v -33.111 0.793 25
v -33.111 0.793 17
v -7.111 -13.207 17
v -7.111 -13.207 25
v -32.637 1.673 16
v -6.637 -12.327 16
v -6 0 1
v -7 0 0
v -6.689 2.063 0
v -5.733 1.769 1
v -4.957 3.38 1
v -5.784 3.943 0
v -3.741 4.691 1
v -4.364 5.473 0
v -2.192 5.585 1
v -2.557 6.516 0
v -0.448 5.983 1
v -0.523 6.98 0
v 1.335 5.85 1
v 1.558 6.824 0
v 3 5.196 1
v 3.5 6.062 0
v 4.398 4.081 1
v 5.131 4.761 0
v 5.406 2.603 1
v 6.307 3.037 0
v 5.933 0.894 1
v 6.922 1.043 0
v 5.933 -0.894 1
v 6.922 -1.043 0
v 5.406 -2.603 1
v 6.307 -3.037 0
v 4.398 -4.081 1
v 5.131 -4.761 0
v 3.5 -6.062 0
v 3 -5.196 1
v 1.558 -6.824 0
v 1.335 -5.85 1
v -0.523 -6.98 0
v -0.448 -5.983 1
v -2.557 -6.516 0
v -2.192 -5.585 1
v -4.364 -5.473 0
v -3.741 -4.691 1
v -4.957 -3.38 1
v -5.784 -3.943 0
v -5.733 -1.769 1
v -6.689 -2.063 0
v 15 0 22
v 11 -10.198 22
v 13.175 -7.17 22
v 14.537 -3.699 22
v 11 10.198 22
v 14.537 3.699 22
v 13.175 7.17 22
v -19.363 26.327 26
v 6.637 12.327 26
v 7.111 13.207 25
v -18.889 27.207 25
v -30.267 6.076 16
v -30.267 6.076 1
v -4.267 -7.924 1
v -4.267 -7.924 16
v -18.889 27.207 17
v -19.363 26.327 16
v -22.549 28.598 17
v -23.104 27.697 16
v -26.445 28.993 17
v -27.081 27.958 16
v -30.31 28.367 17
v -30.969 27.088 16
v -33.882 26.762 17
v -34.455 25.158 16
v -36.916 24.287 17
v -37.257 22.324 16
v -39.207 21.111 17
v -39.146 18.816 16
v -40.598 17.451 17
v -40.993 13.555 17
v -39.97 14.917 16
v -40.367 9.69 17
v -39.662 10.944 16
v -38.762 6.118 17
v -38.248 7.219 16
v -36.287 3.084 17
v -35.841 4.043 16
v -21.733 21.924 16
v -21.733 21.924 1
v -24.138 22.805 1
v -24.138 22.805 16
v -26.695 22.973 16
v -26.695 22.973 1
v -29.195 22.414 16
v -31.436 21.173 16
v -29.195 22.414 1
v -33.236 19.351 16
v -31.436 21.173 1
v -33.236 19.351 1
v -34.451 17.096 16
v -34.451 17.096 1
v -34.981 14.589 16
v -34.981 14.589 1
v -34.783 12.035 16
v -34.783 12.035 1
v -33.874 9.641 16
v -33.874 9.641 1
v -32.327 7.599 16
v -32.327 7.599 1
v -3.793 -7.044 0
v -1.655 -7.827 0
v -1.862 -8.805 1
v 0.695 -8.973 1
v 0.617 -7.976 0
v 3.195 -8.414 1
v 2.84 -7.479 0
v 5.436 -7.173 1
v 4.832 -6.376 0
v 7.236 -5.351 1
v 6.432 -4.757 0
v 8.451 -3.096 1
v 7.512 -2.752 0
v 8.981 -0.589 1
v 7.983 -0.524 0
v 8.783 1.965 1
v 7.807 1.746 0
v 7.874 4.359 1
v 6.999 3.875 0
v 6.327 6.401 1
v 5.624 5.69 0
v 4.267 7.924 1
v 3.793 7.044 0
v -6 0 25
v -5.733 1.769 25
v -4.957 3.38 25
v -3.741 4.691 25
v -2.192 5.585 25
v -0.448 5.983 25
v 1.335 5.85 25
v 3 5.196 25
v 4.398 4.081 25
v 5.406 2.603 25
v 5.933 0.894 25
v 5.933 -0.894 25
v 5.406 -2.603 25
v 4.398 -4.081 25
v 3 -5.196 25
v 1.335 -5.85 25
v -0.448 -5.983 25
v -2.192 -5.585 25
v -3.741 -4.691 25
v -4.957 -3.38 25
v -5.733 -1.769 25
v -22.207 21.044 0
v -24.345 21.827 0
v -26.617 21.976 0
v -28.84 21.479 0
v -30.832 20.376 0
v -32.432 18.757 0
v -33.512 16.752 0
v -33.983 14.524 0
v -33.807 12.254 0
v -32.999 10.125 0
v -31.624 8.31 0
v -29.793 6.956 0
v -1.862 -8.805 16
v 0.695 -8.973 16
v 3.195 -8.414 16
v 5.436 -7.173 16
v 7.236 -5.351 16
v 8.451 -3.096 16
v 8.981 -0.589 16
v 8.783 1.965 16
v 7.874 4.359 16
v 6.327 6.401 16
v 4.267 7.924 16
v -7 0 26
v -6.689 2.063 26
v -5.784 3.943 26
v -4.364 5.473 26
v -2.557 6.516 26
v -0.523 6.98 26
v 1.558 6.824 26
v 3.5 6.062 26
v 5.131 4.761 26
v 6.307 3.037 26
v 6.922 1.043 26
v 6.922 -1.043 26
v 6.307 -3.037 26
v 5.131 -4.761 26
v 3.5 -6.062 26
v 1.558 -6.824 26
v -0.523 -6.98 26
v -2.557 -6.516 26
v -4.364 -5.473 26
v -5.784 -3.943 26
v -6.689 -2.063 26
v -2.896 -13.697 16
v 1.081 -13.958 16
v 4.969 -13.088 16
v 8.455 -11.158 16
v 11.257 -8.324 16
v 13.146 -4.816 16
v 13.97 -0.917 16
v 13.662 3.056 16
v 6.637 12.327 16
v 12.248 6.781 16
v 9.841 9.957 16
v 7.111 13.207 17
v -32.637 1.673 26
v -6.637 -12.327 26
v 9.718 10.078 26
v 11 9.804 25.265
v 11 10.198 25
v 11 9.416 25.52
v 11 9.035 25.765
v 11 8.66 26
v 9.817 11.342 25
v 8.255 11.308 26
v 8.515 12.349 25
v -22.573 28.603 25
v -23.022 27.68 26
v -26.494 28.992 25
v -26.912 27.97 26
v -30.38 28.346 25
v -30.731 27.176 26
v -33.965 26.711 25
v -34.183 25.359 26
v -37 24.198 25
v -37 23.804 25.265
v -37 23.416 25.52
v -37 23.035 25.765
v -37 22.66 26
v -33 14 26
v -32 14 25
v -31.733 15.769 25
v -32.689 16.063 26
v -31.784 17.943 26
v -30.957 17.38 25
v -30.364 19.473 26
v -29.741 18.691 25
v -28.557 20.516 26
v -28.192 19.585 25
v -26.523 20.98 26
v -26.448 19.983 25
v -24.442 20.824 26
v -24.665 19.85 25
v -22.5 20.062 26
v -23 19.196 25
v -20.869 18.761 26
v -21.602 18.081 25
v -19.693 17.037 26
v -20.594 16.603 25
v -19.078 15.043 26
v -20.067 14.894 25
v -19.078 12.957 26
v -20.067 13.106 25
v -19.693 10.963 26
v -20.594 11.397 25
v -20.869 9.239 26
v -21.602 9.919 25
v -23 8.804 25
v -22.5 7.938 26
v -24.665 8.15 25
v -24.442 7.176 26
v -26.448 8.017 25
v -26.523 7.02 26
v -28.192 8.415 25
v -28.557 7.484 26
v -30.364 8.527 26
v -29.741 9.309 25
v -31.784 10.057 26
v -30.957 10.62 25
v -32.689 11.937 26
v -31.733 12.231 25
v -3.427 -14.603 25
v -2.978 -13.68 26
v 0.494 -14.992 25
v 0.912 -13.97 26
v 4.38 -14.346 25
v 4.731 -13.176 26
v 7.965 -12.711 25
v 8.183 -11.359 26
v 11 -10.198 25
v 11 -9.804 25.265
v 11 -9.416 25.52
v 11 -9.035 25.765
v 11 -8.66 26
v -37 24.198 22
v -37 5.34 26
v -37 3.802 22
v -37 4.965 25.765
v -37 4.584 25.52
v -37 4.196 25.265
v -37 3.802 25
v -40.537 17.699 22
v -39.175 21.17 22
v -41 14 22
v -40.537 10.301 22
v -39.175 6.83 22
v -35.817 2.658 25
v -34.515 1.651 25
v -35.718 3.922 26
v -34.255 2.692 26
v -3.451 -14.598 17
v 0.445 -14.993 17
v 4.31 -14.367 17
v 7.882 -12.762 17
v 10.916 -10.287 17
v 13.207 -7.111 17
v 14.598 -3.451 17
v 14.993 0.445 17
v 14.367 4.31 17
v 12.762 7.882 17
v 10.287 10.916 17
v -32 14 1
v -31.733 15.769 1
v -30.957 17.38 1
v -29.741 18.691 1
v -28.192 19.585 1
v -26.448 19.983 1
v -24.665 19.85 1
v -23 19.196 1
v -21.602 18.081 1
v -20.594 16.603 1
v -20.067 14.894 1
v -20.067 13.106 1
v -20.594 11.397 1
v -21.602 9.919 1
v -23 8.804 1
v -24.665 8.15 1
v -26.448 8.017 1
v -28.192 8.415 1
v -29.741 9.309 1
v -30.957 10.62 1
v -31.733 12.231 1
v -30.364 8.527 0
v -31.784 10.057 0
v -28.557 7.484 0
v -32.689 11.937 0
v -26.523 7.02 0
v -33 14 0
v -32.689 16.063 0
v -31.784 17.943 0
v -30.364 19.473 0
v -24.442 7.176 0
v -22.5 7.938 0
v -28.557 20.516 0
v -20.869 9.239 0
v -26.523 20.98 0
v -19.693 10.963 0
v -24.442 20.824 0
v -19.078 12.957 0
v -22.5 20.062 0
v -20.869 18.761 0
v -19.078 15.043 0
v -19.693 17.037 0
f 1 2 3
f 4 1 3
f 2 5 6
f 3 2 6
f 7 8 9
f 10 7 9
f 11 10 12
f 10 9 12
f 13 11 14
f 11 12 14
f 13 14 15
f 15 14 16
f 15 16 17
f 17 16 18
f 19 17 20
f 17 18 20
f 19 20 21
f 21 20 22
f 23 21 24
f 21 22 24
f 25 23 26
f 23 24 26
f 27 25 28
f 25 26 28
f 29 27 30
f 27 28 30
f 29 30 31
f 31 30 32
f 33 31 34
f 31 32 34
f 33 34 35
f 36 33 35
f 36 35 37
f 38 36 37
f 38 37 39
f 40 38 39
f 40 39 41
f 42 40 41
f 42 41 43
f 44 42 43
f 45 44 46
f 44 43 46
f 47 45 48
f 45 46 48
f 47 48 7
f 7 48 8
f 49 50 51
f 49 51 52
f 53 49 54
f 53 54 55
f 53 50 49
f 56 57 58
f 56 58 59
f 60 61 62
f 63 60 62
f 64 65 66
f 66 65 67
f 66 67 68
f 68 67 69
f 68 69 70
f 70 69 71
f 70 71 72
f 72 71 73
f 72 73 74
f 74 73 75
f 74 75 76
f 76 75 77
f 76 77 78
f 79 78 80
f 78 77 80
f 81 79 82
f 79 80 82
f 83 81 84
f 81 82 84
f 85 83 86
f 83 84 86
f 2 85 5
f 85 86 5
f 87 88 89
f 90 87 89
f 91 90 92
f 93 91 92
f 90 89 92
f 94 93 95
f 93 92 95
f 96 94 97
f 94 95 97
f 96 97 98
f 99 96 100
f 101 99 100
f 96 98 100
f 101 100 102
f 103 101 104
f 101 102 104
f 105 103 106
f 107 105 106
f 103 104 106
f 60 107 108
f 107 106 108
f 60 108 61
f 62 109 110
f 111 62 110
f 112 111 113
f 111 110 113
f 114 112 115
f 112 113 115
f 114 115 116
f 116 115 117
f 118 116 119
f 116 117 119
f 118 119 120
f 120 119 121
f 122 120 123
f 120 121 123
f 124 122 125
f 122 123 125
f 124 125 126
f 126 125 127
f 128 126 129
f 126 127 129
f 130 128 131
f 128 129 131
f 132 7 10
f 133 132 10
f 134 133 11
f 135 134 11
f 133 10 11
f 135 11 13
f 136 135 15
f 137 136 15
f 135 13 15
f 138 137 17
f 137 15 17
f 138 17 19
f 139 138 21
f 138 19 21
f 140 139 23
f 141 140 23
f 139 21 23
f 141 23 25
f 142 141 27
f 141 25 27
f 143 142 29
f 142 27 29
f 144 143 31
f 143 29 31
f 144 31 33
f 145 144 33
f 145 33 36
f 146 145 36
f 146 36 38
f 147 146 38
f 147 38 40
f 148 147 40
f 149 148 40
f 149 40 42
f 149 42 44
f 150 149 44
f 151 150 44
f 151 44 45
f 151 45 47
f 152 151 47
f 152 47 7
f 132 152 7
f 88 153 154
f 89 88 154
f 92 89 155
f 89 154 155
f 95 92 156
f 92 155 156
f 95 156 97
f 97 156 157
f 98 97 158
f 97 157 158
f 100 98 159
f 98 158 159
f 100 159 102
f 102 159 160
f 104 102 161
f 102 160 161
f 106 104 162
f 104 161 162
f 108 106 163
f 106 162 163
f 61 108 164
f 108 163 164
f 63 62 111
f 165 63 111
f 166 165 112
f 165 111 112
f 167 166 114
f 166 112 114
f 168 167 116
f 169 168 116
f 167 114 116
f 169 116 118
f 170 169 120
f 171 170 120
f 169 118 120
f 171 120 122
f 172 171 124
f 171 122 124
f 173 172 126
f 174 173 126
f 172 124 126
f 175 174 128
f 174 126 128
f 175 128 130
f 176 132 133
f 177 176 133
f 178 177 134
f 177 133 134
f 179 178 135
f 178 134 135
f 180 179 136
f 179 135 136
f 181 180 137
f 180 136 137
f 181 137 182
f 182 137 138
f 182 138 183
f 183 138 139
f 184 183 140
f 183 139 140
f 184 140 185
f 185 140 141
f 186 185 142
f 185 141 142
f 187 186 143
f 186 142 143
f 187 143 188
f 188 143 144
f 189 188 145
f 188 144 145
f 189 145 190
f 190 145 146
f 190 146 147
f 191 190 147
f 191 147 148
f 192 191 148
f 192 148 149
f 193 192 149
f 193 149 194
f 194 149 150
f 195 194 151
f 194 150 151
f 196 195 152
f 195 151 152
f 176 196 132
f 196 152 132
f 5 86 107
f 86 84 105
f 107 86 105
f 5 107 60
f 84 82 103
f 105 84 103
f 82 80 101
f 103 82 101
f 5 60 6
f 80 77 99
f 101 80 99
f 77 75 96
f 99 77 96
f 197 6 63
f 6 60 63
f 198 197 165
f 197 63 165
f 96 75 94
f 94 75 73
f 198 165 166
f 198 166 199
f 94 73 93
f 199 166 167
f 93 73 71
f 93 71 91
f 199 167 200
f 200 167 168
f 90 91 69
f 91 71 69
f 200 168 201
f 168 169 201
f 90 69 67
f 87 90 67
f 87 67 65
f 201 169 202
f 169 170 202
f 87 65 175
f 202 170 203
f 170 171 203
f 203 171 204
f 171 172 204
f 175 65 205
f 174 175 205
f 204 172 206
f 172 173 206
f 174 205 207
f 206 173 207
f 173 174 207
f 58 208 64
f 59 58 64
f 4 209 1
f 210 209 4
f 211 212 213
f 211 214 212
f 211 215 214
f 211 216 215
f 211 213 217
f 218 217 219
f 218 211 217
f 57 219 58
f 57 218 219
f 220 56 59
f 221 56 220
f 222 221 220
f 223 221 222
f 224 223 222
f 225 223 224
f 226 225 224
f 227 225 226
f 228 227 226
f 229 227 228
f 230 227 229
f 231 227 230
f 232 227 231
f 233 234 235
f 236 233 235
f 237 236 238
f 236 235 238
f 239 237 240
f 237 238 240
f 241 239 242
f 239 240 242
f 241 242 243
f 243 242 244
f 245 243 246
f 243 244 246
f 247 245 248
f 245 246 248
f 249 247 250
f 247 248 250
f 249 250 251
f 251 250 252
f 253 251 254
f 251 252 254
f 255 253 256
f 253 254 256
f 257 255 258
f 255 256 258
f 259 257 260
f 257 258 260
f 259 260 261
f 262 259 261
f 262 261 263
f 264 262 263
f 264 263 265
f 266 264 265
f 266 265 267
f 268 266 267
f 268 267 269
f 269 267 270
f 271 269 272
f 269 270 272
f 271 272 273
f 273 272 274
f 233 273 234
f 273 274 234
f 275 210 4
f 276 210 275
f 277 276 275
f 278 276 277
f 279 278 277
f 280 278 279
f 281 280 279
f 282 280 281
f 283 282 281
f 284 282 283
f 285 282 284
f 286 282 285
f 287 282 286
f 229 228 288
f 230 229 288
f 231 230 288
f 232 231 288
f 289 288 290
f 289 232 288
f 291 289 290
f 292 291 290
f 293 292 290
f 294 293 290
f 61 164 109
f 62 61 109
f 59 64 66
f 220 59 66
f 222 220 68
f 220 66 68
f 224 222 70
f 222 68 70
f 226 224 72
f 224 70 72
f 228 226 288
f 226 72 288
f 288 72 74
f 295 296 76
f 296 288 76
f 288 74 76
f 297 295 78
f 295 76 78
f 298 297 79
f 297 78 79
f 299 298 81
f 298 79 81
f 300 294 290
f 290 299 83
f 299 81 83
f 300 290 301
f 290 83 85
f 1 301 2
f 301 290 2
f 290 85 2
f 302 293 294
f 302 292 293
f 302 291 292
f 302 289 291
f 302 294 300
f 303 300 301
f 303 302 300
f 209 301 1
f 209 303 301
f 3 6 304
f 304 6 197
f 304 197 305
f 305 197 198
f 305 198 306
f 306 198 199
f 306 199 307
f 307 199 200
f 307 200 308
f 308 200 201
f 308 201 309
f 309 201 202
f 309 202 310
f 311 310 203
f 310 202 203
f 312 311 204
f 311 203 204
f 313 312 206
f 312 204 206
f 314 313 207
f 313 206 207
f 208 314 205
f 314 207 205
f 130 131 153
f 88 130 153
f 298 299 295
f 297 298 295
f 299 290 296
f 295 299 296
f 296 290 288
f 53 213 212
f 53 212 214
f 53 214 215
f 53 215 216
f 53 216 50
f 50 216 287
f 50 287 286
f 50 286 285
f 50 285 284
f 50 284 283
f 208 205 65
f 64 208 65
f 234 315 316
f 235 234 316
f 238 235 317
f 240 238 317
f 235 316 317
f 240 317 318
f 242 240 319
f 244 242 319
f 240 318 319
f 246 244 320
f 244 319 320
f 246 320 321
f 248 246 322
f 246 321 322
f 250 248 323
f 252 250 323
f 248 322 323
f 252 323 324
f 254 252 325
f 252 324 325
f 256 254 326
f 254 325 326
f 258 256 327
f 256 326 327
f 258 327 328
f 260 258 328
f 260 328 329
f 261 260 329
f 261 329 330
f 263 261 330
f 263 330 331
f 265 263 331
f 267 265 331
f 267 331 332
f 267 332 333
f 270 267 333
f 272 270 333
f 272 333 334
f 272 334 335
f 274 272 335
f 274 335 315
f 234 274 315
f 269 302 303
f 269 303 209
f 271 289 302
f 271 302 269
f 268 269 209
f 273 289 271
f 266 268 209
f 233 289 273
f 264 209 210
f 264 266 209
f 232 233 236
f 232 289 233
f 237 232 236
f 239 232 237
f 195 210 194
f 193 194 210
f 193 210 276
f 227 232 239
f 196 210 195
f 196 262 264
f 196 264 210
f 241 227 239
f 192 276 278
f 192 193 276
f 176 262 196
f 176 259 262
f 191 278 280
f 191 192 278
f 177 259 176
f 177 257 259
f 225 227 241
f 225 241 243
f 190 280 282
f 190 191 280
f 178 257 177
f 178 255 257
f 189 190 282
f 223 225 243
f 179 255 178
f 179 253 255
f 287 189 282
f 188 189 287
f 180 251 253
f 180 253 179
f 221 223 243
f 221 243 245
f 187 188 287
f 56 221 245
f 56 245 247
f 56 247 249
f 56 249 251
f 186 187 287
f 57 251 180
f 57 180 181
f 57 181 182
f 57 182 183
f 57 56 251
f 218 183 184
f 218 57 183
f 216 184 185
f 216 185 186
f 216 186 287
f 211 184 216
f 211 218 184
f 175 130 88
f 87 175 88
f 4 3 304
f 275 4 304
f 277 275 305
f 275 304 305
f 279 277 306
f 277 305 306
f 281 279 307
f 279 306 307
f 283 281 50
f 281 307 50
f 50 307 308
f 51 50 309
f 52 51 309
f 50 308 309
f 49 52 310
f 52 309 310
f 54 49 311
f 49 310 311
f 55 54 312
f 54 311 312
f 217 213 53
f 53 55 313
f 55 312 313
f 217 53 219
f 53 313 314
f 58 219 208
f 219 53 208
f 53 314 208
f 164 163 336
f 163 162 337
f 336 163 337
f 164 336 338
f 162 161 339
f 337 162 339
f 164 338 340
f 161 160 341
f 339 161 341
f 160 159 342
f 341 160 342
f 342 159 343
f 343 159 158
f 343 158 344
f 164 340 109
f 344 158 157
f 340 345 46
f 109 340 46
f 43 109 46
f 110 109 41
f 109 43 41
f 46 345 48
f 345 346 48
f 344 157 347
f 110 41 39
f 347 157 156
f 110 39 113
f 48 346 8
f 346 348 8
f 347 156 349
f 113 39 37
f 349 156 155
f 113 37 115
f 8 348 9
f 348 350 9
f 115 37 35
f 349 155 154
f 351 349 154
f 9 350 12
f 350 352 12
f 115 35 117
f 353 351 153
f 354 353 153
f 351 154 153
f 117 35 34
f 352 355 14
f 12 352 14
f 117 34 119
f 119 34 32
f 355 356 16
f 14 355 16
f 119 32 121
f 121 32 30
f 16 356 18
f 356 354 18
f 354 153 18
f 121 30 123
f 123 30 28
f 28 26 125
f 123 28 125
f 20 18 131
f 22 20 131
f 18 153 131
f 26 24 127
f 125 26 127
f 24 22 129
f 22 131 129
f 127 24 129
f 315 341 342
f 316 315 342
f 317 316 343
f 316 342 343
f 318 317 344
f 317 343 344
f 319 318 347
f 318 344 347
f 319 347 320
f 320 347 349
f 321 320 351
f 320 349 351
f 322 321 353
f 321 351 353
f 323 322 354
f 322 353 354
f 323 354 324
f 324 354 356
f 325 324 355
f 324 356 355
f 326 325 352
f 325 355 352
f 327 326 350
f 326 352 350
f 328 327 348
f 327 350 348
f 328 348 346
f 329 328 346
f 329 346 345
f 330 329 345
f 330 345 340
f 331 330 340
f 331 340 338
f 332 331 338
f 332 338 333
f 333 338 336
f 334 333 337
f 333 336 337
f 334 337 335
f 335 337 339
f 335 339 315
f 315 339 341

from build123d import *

# Parameters (mm, degrees)
EXTRUDE_1_DEPTH     = 16
EXTRUDE_2_DEPTH     = 10
CUT_EXTRUDE_1_DEPTH = 4
SKETCH_4_R          = 6
CUT_EXTRUDE_2_DEPTH = 27
CHAMFER_1_SIZE      = 1


with BuildPart() as part:
    # 草图1 → 凸台-拉伸1 (new body)
    with BuildSketch(Plane.XY):
        with BuildLine():
            Line((-30.266898407, 6.075760101), (-4.266898407, -7.924239899))
            ThreePointArc((-4.266898407, -7.924239899), (7.924239899, -4.266898407), (4.266898407, 7.924239899))
            Line((4.266898407, 7.924239899), (-21.733101593, 21.924239899))
            ThreePointArc((-21.733101593, 21.924239899), (-33.924239899, 18.266898407), (-30.266898407, 6.075760101))
        make_face()
    extrude(amount=EXTRUDE_1_DEPTH)

    # 草图2 → 凸台-拉伸2 (add)
    with BuildSketch(Plane.XY.offset(16)):
        with BuildLine():
            Line((7.111497346, 13.207066499), (-18.888502654, 27.207066499))
            ThreePointArc((-18.888502654, 27.207066499), (-39.207066499, 21.111497346), (-33.111497346, 0.792933501))
            Line((-33.111497346, 0.792933501), (-7.111497346, -13.207066499))
            ThreePointArc((-7.111497346, -13.207066499), (13.207066499, -7.111497346), (7.111497346, 13.207066499))
        make_face()
    extrude(amount=EXTRUDE_2_DEPTH)

    # 草图3 → 切除-拉伸1 (cut)
    with BuildSketch(Plane.XY.offset(26)):
        with BuildLine():
            Line((-37, 24.198039027), (-37, 3.801960973))
            ThreePointArc((-37, 3.801960973), (-41, 14), (-37, 24.198039027))
        make_face()
        with BuildLine():
            Line((11, 10.198039027), (11, -10.198039027))
            ThreePointArc((11, -10.198039027), (15, 0), (11, 10.198039027))
        make_face()
    extrude(amount=-CUT_EXTRUDE_1_DEPTH, mode=Mode.SUBTRACT)

    # 草图4 → 切除-拉伸2 (cut, through all)
    with BuildSketch(Plane(origin=(0, 0, 0), x_dir=(-1, 0, 0), z_dir=(0, 0, -1))):
        Circle(SKETCH_4_R)
        with Locations((26, 14)):
            Circle(SKETCH_4_R)
    extrude(amount=-CUT_EXTRUDE_2_DEPTH, mode=Mode.SUBTRACT)

    # 倒角1
    chamfer_1_edges = [part.edges().sort_by_distance(p)[0] for p in [
        (13.207066499, -7.111497346, 16),
        (-5.888502654, 20.207066499, 16),
        (-39.207066499, 21.111497346, 16),
        (-20.111497346, -6.207066499, 16),
        (2.45838866, -14.797172878, 26),
        (-5.888502654, 20.207066499, 26),
        (-28.45838866, 28.797172878, 26),
        (-20.111497346, -6.207066499, 26),
        (9.179877211, 11.862961451, 26),
        (-35.179877211, 2.137038549, 26),
        (-17.266898407, -0.924239899, 0),
        (6, 0, 26),
        (6, 0, 0),
        (-20, 14, 26),
        (-20, 14, 0),
        (-33.924239899, 18.266898407, 0),
        (-8.733101593, 14.924239899, 0),
        (7.924239899, -4.266898407, 0),
    ]]
    chamfer(chamfer_1_edges, length=CHAMFER_1_SIZE)


solid = part.part
